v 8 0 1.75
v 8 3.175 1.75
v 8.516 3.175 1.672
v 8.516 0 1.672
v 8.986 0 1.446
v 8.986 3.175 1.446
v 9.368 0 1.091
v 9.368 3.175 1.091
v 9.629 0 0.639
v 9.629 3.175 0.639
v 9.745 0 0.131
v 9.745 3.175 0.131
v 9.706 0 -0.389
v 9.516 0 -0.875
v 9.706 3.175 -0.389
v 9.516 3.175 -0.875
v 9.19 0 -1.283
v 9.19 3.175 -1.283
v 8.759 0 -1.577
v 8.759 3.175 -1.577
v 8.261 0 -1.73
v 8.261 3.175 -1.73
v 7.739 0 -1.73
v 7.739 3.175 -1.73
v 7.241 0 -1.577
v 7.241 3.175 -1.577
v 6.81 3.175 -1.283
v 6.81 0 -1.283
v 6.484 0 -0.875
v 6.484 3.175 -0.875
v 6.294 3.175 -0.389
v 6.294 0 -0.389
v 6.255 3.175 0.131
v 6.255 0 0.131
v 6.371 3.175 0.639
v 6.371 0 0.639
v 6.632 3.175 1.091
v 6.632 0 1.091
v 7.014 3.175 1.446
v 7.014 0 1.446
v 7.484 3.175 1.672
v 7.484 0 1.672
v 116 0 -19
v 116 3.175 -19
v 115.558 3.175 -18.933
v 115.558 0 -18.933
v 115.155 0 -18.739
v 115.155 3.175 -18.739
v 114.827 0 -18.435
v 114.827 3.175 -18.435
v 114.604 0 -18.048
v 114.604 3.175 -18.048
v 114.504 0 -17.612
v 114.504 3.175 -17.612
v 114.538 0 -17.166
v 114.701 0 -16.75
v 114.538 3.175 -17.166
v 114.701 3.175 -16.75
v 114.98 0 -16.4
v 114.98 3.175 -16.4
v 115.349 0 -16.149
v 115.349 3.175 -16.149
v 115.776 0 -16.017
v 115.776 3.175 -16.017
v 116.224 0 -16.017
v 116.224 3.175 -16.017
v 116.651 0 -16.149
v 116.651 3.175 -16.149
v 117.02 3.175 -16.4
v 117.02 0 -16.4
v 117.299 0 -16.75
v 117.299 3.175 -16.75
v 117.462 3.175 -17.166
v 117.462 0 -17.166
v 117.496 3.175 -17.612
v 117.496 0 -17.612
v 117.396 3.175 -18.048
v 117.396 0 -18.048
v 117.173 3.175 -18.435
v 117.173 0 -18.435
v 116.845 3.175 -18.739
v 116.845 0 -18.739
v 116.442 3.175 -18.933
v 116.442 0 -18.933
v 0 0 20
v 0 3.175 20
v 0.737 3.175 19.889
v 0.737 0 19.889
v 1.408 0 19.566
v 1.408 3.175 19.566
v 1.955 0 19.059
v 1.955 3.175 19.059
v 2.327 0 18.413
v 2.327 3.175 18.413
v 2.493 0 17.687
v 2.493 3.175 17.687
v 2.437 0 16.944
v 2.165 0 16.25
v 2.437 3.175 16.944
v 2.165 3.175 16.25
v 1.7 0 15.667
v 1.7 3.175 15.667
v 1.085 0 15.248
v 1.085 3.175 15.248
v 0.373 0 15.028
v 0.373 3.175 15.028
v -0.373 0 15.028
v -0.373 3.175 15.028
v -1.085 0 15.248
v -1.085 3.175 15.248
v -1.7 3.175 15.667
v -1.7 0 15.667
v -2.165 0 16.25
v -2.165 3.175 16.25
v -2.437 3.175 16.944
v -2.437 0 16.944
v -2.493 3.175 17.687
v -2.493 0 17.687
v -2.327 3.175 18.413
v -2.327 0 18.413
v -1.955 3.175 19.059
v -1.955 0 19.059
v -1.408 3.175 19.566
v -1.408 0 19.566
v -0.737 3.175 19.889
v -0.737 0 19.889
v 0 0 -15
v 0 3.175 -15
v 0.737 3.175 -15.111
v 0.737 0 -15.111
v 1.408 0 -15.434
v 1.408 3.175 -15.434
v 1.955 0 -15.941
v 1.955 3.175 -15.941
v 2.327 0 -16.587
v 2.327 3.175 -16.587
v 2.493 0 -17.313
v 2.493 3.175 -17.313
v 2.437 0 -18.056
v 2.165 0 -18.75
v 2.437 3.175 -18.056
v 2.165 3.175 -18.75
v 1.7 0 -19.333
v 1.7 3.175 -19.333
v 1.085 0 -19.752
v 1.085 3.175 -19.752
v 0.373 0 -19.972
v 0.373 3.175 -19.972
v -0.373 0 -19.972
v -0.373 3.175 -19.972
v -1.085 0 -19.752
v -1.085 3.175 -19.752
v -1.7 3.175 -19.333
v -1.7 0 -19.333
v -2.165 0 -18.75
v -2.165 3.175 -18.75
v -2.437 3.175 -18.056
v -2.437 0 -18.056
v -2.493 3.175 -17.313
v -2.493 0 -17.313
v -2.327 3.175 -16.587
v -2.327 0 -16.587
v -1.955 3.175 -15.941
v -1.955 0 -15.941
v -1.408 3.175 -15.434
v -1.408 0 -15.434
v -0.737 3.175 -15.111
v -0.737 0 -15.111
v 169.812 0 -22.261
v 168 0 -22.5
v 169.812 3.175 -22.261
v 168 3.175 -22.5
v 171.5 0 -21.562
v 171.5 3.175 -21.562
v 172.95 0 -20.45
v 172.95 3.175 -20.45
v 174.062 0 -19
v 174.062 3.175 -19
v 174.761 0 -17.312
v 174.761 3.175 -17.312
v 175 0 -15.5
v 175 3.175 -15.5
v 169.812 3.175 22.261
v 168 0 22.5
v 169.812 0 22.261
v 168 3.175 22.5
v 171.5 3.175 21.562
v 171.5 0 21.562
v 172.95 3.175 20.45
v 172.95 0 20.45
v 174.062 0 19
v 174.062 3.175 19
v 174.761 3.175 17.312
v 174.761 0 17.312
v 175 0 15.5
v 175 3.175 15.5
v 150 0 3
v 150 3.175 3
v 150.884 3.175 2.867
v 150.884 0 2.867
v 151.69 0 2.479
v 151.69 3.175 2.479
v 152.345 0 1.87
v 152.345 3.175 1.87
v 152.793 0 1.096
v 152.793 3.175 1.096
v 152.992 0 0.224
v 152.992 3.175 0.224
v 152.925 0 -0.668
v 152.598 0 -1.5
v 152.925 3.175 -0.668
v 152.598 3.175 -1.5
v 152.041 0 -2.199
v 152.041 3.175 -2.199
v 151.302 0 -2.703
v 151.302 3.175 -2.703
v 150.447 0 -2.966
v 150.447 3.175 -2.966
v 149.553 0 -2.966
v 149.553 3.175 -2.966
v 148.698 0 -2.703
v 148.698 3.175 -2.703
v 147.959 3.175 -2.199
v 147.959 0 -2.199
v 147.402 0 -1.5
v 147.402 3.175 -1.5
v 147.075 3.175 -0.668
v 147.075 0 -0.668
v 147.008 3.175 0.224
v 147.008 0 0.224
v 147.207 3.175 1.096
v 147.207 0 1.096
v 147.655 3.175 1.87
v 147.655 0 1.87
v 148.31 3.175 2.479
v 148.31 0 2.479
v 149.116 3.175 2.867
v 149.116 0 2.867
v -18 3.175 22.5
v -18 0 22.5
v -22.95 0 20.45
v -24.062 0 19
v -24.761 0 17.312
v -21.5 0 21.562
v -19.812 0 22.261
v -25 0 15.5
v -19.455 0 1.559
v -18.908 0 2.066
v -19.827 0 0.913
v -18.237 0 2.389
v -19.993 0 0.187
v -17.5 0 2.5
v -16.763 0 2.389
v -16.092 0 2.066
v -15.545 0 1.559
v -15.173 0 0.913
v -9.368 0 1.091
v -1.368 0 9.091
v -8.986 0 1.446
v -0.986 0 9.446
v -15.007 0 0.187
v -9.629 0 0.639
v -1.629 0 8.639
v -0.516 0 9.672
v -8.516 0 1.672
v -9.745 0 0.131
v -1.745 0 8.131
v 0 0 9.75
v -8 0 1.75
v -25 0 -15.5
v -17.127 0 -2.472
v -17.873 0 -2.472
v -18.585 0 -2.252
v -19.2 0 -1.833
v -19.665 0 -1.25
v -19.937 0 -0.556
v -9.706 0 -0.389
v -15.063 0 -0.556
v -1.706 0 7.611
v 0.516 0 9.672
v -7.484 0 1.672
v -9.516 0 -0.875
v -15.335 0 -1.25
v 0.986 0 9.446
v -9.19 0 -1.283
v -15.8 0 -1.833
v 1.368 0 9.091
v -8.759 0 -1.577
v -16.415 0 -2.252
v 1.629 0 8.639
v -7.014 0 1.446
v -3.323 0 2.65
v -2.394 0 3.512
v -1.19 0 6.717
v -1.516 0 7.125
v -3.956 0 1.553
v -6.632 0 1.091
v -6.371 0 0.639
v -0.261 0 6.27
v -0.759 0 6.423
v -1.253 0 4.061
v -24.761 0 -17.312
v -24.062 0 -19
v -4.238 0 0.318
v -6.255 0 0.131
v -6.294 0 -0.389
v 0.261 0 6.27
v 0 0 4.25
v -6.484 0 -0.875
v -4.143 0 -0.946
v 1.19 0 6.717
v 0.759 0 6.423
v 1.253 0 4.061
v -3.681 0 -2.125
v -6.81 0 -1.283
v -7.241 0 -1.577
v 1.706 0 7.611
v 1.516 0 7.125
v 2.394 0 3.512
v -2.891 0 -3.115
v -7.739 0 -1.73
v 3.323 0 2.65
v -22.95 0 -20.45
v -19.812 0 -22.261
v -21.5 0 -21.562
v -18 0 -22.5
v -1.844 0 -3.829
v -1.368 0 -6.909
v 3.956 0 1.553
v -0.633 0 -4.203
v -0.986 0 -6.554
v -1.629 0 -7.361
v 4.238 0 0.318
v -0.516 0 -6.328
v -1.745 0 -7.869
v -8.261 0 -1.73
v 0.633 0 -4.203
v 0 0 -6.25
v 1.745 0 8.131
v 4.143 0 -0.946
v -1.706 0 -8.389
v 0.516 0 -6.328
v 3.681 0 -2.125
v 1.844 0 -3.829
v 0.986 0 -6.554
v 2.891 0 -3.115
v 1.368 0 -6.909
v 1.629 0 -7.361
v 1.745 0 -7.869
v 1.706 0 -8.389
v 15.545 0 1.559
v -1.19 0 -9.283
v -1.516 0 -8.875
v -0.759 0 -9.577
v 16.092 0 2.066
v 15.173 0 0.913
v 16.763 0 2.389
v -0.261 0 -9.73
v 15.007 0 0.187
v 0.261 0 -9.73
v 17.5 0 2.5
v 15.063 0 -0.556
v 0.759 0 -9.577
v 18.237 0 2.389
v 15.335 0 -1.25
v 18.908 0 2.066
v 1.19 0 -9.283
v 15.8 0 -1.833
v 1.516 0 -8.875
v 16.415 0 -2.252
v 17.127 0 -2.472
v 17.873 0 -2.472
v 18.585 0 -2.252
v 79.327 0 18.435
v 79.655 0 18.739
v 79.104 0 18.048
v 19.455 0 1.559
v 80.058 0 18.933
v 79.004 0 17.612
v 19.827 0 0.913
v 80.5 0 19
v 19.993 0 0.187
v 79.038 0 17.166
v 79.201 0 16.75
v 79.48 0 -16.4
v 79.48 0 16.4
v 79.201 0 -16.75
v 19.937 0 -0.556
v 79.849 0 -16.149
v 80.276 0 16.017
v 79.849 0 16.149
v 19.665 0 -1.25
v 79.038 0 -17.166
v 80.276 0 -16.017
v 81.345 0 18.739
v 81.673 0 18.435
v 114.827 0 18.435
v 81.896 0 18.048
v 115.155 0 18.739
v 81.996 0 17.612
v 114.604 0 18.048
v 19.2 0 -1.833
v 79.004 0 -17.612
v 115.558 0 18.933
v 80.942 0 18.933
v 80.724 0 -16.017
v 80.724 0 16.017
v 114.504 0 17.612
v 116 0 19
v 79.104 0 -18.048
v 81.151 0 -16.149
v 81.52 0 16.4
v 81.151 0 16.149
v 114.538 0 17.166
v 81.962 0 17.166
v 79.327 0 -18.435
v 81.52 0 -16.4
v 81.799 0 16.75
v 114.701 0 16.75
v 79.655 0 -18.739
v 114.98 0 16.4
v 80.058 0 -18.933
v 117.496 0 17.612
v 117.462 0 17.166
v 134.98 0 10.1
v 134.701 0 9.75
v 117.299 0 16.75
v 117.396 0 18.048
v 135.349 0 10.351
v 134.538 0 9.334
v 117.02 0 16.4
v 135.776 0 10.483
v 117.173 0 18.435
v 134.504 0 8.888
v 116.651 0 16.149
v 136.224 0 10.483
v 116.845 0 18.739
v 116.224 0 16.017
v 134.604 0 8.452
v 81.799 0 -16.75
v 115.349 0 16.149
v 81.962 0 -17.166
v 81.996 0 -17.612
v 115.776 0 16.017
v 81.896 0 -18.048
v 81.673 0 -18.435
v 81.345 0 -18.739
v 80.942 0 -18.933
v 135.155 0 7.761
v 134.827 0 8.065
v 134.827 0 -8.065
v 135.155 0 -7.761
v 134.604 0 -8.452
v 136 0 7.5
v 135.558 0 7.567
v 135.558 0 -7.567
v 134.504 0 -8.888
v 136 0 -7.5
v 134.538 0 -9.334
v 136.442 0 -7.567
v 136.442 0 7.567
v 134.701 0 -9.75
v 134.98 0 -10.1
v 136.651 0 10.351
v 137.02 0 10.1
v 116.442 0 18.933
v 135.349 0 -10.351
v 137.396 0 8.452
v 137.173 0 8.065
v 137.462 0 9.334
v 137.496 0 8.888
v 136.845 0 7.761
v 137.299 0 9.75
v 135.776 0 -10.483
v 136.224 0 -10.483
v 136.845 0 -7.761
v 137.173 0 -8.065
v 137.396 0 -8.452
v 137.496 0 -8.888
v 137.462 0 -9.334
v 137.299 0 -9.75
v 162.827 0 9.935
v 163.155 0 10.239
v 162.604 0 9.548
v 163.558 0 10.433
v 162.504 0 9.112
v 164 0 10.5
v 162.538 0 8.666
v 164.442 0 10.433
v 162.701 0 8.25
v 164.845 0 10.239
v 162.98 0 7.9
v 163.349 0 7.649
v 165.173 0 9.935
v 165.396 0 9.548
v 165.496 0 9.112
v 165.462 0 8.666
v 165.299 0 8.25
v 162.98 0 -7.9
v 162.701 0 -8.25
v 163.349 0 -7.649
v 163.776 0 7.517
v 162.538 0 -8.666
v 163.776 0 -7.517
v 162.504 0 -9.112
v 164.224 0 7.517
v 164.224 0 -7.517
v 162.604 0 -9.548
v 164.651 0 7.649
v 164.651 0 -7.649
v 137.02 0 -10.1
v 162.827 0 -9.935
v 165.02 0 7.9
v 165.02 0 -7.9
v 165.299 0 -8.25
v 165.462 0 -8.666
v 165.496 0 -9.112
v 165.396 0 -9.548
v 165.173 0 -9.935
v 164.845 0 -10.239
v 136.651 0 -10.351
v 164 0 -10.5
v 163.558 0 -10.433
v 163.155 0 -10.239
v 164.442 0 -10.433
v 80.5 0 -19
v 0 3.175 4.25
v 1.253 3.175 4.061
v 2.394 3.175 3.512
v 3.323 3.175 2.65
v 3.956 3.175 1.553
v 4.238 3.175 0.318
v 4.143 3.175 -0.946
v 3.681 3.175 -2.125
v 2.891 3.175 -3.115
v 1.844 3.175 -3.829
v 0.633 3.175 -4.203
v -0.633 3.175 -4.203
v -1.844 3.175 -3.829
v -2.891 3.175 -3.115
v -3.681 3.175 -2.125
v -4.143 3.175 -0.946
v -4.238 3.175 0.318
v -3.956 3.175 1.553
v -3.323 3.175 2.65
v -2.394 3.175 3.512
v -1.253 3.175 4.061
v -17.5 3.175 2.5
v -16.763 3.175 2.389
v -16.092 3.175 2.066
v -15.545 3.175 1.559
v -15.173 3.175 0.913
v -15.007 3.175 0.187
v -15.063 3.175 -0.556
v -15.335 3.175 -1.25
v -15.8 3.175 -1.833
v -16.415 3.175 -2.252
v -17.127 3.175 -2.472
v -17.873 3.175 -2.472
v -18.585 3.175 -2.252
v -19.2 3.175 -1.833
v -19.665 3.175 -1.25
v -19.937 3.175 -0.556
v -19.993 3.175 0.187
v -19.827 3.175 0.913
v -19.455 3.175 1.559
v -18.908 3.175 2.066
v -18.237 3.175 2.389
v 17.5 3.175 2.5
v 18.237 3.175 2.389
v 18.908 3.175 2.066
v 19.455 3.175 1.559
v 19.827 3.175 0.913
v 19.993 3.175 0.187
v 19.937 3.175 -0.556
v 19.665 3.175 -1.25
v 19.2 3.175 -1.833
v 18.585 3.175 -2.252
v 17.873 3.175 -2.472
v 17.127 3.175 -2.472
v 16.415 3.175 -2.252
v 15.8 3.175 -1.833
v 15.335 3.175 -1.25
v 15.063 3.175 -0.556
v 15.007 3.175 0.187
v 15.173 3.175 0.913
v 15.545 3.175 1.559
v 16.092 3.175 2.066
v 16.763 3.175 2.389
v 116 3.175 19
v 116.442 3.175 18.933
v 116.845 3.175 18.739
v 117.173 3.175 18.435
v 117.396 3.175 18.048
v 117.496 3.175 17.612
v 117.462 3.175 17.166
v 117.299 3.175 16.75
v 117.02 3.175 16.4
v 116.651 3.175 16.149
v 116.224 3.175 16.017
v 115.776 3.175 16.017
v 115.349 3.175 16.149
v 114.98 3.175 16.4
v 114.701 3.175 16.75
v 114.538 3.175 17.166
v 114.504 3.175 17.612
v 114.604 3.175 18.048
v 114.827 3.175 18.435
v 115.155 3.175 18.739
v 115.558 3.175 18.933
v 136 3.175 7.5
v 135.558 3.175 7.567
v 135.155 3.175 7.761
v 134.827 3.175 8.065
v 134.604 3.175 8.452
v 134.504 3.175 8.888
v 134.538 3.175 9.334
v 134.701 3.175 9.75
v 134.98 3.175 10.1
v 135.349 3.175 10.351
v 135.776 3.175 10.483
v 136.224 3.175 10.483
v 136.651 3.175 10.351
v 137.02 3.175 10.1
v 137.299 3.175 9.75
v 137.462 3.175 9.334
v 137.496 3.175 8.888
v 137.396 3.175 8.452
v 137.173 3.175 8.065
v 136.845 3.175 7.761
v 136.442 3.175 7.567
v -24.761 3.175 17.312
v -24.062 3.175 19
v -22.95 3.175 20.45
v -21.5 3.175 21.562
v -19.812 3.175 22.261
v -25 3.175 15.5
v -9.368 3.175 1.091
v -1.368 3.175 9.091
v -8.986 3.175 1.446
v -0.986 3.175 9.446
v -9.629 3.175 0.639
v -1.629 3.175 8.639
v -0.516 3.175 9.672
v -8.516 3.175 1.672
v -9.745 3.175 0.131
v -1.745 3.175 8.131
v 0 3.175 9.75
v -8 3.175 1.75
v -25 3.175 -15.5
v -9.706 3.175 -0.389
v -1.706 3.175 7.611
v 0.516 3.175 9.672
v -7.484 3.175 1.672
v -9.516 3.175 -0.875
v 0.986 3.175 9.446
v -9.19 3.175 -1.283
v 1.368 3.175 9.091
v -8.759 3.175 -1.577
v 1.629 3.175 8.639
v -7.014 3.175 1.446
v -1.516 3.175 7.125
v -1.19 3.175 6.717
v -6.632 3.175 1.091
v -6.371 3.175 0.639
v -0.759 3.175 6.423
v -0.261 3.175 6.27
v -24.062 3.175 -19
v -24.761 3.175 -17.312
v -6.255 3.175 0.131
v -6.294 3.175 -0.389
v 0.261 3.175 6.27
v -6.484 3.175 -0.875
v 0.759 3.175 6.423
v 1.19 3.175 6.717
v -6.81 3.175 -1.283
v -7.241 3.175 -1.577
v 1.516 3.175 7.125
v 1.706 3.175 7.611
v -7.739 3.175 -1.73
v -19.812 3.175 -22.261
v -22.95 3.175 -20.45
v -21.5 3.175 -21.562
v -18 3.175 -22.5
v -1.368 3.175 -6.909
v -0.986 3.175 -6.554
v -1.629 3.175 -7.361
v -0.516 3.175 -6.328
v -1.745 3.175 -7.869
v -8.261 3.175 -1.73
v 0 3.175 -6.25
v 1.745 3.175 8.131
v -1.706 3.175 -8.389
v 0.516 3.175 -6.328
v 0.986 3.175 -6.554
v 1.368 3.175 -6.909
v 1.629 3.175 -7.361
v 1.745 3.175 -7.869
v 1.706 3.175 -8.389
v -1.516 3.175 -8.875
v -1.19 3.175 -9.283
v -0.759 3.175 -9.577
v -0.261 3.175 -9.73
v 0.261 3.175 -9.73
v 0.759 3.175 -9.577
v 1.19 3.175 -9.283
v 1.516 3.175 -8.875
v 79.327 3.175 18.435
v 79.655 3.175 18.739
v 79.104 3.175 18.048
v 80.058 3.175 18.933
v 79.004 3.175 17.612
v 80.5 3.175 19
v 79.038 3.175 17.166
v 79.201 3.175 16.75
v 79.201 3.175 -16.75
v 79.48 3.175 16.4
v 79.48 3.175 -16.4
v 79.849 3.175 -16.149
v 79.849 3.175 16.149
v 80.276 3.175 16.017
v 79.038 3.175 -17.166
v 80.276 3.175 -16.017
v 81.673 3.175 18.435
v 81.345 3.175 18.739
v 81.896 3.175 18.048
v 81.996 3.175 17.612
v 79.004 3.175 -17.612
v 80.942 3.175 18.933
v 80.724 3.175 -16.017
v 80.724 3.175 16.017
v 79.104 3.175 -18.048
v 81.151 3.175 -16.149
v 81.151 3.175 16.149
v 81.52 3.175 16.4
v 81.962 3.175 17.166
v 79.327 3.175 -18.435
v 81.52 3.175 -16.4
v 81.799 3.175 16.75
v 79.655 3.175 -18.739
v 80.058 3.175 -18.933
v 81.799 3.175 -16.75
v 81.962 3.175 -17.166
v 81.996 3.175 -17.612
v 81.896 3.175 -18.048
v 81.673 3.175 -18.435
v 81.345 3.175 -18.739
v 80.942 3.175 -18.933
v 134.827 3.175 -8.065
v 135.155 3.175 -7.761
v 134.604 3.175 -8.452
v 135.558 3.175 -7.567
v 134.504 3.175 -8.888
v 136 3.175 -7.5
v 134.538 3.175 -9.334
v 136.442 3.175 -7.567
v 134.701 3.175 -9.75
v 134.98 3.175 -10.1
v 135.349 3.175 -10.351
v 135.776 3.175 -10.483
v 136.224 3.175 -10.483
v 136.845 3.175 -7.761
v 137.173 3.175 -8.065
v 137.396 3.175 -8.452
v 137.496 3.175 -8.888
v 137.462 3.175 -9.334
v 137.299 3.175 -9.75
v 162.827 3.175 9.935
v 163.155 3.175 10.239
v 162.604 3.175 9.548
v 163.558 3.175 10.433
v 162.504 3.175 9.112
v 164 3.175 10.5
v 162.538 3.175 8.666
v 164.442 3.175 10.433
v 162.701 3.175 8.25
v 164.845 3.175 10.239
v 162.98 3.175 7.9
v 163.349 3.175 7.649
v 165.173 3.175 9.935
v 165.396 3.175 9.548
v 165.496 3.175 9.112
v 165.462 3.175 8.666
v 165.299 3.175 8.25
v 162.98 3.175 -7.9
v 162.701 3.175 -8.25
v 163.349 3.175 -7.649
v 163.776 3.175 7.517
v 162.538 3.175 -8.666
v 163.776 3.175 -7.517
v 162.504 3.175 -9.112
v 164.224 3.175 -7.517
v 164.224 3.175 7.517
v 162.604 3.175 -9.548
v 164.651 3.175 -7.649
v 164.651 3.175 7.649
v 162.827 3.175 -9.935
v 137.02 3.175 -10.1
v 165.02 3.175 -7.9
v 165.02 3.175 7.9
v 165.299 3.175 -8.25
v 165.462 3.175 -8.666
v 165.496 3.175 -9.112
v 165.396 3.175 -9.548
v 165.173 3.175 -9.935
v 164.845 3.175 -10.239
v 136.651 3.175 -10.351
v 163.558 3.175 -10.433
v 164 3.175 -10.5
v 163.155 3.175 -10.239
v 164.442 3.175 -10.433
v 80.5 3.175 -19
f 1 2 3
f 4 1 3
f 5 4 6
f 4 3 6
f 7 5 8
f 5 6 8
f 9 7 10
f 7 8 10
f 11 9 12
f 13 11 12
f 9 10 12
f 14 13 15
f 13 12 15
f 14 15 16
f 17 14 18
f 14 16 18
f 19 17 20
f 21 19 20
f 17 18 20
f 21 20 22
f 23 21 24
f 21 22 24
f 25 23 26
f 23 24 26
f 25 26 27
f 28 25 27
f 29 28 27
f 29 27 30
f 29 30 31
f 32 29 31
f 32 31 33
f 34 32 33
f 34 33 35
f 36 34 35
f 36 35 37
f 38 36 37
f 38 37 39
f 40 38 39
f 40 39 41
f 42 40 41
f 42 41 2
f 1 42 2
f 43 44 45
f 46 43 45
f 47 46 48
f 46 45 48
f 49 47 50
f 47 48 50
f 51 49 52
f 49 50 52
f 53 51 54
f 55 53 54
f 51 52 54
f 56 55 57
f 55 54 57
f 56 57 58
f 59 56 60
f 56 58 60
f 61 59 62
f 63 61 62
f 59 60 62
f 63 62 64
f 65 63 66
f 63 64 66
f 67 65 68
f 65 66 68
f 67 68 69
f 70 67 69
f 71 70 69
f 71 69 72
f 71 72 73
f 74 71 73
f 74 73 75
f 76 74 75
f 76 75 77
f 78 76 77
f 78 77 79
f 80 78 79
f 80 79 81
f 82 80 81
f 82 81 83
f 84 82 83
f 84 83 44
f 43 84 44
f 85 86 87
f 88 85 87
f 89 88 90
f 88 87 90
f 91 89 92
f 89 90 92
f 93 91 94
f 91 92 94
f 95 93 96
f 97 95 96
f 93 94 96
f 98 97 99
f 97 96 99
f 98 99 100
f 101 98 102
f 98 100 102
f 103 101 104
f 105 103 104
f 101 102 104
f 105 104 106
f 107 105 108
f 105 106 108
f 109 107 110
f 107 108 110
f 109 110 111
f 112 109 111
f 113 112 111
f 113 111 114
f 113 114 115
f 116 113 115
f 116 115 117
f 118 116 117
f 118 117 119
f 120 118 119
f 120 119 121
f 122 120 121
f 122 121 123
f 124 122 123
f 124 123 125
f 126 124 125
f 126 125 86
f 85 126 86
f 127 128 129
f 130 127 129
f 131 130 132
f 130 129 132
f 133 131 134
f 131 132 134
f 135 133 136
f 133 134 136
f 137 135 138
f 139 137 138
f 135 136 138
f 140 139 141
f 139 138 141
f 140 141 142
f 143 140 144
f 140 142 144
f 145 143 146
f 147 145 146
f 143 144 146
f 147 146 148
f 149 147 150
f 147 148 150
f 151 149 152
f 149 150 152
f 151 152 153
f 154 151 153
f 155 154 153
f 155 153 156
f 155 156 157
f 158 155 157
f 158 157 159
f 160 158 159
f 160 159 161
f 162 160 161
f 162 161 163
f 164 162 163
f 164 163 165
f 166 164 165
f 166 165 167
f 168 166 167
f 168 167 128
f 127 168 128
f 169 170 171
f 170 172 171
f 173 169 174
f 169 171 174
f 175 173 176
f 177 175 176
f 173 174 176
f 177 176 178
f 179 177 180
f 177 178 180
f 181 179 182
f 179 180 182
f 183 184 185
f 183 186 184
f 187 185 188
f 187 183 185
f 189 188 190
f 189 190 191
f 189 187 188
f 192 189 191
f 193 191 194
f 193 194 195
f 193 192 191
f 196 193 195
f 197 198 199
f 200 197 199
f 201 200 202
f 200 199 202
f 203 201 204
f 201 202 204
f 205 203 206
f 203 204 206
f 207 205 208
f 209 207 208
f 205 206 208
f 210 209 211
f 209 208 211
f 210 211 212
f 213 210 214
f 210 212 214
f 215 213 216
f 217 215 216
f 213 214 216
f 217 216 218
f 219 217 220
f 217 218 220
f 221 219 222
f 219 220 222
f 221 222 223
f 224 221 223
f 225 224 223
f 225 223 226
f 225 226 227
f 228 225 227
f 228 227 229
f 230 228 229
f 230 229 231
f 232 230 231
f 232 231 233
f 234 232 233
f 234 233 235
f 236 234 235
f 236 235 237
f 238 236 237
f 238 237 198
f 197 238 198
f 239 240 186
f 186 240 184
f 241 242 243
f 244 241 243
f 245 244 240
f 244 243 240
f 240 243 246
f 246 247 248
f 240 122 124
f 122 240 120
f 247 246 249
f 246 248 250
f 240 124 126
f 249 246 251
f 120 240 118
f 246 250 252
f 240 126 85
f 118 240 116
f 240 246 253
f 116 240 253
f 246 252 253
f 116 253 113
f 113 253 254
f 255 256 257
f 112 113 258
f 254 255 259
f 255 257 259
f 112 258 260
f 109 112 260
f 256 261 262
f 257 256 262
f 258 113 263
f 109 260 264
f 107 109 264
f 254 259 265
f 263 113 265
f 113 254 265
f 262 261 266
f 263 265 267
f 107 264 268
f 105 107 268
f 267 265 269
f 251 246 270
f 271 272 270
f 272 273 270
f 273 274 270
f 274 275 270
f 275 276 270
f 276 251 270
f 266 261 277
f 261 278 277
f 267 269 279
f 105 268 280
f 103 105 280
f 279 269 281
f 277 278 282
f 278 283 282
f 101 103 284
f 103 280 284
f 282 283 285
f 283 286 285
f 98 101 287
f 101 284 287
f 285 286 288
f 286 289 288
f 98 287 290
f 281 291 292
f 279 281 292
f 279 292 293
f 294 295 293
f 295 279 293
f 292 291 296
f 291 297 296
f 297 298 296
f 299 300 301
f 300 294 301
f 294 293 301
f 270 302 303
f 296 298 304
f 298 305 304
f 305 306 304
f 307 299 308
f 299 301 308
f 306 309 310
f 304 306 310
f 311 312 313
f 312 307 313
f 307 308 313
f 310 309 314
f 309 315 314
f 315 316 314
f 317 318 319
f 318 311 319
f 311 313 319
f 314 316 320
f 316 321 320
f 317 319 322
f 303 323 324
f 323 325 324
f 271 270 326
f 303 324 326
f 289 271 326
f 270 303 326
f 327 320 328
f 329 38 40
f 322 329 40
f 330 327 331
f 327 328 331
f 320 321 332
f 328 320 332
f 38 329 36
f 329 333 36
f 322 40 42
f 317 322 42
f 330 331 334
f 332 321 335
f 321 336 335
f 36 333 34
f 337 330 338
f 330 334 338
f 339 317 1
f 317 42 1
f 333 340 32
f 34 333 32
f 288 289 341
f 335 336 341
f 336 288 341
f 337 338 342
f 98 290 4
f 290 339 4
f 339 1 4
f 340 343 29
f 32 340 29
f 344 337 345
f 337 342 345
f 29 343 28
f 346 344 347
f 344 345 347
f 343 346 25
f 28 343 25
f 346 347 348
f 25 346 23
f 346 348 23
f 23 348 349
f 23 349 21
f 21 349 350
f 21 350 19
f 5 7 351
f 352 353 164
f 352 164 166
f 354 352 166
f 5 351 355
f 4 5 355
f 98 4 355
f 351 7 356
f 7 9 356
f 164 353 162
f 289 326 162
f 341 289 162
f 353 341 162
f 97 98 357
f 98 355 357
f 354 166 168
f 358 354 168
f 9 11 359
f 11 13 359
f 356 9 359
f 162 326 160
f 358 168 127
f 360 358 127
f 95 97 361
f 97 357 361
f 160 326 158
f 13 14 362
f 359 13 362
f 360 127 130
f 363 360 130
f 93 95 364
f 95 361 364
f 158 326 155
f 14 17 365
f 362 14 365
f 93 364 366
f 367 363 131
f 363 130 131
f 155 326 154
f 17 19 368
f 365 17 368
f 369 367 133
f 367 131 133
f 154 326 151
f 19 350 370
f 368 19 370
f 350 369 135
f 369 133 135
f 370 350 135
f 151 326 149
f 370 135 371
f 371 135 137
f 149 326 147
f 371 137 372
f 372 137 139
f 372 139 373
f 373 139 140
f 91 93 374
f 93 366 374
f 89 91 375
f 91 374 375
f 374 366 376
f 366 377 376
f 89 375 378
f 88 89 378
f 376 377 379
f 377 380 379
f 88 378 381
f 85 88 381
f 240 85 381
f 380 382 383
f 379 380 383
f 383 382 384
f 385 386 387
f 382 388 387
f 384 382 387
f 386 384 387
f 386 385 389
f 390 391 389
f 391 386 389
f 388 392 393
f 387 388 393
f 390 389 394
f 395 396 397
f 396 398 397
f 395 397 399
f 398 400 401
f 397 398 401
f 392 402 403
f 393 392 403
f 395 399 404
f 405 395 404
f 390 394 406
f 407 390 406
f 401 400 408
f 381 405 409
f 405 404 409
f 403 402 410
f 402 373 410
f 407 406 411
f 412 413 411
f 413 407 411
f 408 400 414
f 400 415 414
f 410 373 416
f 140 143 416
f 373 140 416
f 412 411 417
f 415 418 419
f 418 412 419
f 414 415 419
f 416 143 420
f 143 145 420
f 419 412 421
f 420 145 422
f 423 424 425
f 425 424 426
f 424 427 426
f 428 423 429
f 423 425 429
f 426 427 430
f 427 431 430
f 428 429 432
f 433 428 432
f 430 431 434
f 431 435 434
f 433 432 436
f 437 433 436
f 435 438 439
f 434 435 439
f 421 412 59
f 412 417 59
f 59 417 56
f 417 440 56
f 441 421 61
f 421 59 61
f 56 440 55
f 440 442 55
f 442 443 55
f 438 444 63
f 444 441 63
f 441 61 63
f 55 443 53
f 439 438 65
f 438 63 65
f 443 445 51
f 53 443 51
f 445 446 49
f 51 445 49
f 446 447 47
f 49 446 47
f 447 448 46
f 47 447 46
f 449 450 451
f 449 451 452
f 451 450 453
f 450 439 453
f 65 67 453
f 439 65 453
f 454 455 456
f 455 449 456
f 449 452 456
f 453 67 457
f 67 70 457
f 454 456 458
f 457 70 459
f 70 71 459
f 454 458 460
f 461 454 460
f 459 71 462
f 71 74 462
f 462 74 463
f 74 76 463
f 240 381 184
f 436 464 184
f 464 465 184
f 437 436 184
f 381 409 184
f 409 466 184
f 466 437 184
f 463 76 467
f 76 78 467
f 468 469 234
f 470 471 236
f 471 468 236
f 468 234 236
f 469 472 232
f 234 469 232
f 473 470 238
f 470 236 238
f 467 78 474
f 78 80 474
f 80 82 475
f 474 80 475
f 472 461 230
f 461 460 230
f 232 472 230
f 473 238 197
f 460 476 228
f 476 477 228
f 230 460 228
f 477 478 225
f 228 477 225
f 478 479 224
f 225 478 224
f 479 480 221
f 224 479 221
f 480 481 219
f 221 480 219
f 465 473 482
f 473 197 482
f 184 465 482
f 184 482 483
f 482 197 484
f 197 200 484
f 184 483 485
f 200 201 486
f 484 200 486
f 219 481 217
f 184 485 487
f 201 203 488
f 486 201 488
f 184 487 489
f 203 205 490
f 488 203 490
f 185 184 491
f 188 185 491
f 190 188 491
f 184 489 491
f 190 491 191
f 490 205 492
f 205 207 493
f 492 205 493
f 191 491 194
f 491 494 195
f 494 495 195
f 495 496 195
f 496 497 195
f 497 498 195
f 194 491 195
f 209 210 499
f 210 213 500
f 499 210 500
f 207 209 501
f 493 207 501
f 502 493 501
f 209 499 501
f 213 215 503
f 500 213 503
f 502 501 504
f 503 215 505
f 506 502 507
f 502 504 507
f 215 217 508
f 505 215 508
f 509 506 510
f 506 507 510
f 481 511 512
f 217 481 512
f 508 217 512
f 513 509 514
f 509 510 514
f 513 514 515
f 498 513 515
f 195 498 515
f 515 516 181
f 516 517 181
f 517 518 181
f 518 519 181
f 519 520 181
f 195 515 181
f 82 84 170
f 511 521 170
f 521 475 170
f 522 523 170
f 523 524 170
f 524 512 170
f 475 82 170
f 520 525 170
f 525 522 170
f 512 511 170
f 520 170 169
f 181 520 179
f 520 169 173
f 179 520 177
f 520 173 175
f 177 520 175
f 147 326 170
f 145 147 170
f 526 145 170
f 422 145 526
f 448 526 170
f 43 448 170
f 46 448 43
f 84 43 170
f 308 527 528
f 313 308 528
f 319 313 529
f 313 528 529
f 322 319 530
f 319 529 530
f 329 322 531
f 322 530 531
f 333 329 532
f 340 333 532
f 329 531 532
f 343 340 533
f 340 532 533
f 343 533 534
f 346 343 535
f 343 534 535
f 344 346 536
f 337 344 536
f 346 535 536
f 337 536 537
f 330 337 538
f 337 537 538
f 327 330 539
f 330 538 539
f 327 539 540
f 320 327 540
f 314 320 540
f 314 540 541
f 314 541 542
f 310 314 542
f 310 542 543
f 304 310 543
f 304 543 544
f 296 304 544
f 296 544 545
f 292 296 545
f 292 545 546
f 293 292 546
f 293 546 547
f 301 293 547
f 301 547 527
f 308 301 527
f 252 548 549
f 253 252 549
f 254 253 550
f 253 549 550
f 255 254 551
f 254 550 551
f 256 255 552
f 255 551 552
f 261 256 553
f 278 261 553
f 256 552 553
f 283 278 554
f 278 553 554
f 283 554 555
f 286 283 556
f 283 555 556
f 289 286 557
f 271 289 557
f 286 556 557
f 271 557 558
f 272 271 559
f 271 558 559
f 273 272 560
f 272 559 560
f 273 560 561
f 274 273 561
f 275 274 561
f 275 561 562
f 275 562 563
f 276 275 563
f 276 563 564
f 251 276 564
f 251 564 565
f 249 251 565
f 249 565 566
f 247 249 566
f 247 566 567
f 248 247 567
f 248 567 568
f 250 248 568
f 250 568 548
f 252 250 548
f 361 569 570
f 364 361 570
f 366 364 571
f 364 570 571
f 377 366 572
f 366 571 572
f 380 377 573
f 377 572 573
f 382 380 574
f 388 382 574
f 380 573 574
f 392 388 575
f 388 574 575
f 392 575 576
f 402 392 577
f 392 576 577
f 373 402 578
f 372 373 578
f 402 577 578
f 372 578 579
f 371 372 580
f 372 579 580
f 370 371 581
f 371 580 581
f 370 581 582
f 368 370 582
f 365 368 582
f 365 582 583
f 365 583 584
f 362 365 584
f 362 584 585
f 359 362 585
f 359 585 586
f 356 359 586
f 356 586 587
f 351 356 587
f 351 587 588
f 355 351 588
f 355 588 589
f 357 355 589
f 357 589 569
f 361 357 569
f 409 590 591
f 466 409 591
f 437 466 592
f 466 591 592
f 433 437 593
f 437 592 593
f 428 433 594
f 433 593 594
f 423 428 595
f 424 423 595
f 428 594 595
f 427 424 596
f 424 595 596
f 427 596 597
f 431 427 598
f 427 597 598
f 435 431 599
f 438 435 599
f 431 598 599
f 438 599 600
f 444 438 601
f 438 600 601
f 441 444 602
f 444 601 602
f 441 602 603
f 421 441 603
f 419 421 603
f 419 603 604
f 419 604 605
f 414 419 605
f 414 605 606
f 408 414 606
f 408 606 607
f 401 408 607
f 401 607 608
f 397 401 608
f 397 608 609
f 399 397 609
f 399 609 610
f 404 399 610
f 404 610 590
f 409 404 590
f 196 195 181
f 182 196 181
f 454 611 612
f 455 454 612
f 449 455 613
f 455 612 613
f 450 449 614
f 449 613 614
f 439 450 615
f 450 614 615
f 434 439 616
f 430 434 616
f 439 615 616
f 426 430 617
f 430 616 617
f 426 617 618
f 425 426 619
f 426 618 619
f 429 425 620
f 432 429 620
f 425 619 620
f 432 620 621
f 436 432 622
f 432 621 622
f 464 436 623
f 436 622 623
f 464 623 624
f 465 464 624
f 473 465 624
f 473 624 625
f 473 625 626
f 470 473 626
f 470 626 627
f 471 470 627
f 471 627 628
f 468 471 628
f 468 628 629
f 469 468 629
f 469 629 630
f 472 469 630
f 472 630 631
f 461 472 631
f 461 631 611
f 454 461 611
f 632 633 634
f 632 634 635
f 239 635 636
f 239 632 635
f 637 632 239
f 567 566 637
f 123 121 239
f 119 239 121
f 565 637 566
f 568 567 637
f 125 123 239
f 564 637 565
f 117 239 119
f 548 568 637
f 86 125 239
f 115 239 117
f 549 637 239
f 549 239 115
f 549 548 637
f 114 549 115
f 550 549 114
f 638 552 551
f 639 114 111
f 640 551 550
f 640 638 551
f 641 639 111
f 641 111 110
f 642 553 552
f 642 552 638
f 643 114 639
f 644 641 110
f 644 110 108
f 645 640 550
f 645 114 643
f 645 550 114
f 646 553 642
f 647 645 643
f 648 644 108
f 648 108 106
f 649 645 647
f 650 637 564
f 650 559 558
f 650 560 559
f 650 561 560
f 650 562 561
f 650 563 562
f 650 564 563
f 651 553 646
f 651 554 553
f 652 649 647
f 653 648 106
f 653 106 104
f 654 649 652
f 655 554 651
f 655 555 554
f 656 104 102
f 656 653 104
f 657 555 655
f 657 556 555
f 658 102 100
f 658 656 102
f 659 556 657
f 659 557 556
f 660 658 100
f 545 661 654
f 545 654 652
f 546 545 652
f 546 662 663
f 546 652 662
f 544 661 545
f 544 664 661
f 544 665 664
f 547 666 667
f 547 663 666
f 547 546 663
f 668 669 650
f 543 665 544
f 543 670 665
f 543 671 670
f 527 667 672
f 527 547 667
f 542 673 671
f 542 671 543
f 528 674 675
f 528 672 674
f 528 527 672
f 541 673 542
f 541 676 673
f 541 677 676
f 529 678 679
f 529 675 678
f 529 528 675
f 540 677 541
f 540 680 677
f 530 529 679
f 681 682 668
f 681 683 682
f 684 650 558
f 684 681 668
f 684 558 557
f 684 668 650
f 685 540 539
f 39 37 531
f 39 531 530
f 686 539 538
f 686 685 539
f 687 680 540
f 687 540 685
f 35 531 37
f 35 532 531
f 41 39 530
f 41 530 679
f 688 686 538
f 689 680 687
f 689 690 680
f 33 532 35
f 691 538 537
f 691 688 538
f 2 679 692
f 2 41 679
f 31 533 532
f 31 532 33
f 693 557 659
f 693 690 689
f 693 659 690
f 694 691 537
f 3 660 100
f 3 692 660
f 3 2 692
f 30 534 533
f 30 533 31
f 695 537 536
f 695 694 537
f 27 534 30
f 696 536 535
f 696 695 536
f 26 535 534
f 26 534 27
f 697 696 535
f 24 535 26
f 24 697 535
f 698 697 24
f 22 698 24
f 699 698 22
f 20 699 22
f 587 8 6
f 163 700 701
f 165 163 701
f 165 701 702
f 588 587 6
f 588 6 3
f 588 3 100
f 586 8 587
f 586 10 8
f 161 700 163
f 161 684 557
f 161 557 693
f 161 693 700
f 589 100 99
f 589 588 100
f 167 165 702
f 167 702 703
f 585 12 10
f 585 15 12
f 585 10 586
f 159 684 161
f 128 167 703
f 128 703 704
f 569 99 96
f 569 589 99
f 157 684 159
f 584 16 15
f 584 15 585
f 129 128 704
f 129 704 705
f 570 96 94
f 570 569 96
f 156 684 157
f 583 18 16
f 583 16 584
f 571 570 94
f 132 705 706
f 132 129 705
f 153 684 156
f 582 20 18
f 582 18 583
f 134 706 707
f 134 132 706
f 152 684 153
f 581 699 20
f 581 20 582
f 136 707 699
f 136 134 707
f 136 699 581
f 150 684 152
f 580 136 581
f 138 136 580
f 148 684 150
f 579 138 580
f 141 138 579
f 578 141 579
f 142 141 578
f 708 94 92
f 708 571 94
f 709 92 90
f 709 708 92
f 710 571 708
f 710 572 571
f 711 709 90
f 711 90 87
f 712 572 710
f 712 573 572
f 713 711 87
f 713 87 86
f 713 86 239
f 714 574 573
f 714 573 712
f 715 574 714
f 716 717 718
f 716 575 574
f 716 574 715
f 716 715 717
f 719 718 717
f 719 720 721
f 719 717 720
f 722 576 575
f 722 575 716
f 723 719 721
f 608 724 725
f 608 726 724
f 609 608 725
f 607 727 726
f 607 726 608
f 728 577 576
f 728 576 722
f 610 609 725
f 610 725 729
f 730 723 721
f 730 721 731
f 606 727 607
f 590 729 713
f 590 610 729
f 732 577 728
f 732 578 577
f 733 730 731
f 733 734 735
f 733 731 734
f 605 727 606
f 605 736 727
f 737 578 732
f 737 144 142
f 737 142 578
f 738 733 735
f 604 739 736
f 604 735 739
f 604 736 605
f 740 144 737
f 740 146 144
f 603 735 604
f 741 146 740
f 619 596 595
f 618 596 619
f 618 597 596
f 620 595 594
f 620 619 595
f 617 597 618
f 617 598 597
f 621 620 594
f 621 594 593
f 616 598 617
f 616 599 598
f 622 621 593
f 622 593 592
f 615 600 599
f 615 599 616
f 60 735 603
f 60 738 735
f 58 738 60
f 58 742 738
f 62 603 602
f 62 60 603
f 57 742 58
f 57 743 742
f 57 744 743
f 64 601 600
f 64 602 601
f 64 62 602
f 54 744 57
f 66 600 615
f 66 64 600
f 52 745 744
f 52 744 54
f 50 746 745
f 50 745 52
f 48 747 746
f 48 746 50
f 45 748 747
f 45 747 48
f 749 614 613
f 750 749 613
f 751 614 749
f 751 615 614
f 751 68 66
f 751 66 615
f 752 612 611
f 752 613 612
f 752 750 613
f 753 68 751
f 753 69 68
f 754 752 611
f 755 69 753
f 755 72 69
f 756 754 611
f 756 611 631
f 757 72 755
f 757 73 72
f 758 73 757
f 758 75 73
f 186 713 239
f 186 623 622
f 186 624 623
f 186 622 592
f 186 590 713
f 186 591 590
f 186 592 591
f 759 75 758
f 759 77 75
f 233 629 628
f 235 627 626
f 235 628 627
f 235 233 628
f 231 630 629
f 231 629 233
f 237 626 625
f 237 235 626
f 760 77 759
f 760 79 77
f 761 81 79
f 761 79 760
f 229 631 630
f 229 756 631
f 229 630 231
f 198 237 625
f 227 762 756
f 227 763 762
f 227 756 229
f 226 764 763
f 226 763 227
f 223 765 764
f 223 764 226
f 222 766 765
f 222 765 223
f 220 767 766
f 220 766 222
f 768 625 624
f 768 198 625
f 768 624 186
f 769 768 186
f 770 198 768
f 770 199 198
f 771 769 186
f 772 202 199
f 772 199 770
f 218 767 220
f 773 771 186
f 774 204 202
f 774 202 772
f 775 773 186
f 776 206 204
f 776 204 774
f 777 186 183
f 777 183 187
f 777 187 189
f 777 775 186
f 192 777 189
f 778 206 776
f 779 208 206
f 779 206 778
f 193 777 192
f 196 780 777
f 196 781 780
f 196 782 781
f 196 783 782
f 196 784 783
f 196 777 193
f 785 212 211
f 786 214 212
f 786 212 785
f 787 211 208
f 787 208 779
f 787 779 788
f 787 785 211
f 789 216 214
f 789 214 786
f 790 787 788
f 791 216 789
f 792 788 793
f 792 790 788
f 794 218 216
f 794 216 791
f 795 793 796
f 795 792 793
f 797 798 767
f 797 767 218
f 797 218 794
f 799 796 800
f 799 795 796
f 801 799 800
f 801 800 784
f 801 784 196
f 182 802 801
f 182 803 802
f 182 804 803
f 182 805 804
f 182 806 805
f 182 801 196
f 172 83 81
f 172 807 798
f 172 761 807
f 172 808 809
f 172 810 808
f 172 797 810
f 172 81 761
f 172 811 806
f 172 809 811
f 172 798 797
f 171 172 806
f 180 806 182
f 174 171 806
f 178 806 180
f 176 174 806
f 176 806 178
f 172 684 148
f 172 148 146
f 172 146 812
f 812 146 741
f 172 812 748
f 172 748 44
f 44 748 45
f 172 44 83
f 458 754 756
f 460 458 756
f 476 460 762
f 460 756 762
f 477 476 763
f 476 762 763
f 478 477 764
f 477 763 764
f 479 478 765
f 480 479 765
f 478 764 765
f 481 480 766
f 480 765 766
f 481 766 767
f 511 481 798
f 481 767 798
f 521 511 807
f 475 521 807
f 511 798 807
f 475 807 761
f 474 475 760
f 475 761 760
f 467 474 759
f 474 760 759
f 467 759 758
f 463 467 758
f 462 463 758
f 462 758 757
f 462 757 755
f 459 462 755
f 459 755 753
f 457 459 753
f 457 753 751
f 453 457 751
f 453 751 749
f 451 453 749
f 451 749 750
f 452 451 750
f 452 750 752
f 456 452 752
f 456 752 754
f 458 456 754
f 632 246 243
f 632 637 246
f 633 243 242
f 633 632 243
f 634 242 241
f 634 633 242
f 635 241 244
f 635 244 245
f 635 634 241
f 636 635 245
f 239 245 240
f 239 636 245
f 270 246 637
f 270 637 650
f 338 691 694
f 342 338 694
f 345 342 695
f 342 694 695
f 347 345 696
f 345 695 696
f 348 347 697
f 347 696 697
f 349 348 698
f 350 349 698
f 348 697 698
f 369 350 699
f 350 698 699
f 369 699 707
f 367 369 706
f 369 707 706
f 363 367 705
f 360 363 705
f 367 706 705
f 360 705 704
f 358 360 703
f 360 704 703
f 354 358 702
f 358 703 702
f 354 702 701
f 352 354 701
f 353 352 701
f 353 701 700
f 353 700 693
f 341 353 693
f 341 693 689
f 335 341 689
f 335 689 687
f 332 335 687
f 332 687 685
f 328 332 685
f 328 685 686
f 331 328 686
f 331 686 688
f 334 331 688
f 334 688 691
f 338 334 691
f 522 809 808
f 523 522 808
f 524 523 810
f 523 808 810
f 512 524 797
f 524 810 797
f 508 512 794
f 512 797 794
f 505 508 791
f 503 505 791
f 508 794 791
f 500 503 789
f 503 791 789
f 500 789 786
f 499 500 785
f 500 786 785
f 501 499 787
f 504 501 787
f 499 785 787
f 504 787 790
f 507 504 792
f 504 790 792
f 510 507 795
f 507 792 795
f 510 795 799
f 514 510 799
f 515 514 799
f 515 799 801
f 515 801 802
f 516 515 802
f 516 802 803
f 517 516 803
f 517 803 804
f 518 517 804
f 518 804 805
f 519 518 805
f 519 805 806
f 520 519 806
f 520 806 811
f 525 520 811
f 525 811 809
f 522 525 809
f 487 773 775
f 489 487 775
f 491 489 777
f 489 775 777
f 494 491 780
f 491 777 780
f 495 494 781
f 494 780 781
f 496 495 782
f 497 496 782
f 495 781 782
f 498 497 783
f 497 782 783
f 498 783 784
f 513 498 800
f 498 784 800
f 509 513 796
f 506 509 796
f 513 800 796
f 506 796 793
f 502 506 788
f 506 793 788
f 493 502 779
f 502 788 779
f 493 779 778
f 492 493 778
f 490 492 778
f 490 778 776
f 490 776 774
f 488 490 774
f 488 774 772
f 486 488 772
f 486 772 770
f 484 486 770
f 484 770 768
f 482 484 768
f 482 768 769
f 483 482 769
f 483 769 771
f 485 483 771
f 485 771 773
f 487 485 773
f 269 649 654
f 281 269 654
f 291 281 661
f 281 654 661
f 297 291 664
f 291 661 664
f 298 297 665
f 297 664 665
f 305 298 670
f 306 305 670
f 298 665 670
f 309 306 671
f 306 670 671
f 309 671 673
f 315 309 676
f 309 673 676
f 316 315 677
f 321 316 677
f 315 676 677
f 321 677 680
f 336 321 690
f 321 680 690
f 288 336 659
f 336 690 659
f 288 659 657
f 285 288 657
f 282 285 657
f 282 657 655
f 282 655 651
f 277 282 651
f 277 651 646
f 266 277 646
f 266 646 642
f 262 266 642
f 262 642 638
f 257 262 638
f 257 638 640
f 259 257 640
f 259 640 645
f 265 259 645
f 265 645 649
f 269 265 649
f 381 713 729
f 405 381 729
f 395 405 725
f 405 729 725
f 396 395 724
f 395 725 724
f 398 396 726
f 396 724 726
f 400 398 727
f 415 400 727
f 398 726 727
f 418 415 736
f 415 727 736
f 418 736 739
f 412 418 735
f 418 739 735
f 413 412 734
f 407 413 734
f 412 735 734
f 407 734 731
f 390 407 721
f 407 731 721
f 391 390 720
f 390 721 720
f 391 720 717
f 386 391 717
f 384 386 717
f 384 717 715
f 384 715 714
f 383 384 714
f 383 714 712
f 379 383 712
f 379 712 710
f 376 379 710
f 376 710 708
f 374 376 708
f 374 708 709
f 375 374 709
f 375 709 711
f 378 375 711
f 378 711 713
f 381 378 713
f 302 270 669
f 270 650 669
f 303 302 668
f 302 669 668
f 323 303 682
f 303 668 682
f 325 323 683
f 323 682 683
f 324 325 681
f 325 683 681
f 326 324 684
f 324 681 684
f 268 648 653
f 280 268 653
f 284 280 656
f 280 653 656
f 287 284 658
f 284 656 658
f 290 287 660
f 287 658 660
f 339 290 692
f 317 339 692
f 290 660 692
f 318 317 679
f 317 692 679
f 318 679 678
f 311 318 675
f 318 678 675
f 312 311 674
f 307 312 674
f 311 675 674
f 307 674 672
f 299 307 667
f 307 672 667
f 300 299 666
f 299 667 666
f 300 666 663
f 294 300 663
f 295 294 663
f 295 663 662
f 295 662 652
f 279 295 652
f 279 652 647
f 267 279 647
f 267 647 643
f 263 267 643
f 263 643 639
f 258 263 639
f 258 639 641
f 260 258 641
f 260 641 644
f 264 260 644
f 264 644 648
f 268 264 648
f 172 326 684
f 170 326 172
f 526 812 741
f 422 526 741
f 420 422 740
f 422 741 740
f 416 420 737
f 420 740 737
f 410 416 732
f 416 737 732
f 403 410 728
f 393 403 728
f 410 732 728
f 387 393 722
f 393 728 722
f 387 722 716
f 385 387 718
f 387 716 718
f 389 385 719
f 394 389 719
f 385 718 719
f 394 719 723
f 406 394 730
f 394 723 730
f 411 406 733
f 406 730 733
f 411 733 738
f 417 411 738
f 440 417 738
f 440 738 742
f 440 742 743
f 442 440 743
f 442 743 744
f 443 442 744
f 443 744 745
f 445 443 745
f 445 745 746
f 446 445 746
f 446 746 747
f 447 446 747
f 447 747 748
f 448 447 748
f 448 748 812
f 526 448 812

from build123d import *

# Parameters (mm, degrees)
SKETCH1_W           = 200
SKETCH1_H           = 45
BOSS_EXTRUDE1_DEPTH = 3.175
SKETCH4_R           = 3
SKETCH4_R_2         = 1.5
CUT_EXTRUDE1_DEPTH  = 177.469064215
SKETCH5_R           = 4.25
CUT_EXTRUDE2_DEPTH  = 177.469064215
SKETCH10_R          = 1.5
CUT_EXTRUDE4_DEPTH  = 177.469064215
FILLET1_R           = 7
SKETCH11_R          = 2.5
CUT_EXTRUDE5_DEPTH  = 177.469064215
SKETCH12_R          = 1.75
CUT_EXTRUDE6_DEPTH  = 177.469064215


with BuildPart() as part:
    # Sketch1 → Boss-Extrude1 (new body)
    with BuildSketch(Plane(origin=(0, 0, 0), x_dir=(1, 0, 0), z_dir=(0, 1, 0))):
        with Locations((75, 0)):
            Rectangle(SKETCH1_W, SKETCH1_H)
    extrude(amount=BOSS_EXTRUDE1_DEPTH)

    # Sketch4 → Cut-Extrude1 (cut, through all)
    with BuildSketch(Plane(origin=(0, 3.175, 0), x_dir=(1, 0, 0), z_dir=(0, 1, 0))):
        with Locations(Location((150, 0, 0), (0, 0, 270))):
            Circle(SKETCH4_R)
        with Locations(Location((136, 9, 0), (0, 0, 270))):
            Circle(SKETCH4_R_2)
        with Locations(Location((164, 9, 0), (0, 0, 90))):
            Circle(SKETCH4_R_2)
        with Locations(Location((164, -9, 0), (0, 0, 270))):
            Circle(SKETCH4_R_2)
        with Locations(Location((136, -9, 0), (0, 0, 90))):
            Circle(SKETCH4_R_2)
    extrude(amount=-CUT_EXTRUDE1_DEPTH, mode=Mode.SUBTRACT)

    # Sketch5 → Cut-Extrude2 (cut, through all)
    with BuildSketch(Plane(origin=(0, 3.175, 0), x_dir=(1, 0, 0), z_dir=(0, 1, 0))):
        with Locations(Location((0, 0, 0), (0, 0, 270))):
            Circle(SKETCH5_R)
    extrude(amount=-CUT_EXTRUDE2_DEPTH, mode=Mode.SUBTRACT)

    # Sketch10 → Cut-Extrude4 (cut, through all)
    with BuildSketch(Plane(origin=(0, 3.175, 0), x_dir=(1, 0, 0), z_dir=(0, 1, 0))):
        with Locations(Location((80.5, -17.5, 0), (0, 0, 270))):
            Circle(SKETCH10_R)
        with Locations(Location((116, -17.5, 0), (0, 0, 270))):
            Circle(SKETCH10_R)
        with Locations(Location((116, 17.5, 0), (0, 0, 90))):
            Circle(SKETCH10_R)
        with Locations(Location((80.5, 17.5, 0), (0, 0, 90))):
            Circle(SKETCH10_R)
    extrude(amount=-CUT_EXTRUDE4_DEPTH, mode=Mode.SUBTRACT)

    # Fillet1
    fillet1_edges = [part.edges().sort_by_distance(p)[0] for p in [
        (-25, 1.5875, -22.5),
        (175, 1.5875, -22.5),
        (175, 1.5875, 22.5),
        (-25, 1.5875, 22.5),
    ]]
    fillet(fillet1_edges, radius=FILLET1_R)

    # Sketch11 → Cut-Extrude5 (cut, through all)
    with BuildSketch(Plane(origin=(0, 3.175, 0), x_dir=(1, 0, 0), z_dir=(0, 1, 0))):
        with Locations(Location((0, 17.5, 0), (0, 0, 270))):
            Circle(SKETCH11_R)
        with Locations(Location((17.5, 0, 0), (0, 0, 270))):
            Circle(SKETCH11_R)
        with Locations(Location((0, -17.5, 0), (0, 0, 270))):
            Circle(SKETCH11_R)
        with Locations(Location((-17.5, 0, 0), (0, 0, 270))):
            Circle(SKETCH11_R)
    extrude(amount=-CUT_EXTRUDE5_DEPTH, mode=Mode.SUBTRACT)

    # Sketch12 → Cut-Extrude6 (cut, through all)
    with BuildSketch(Plane(origin=(0, 3.175, 0), x_dir=(1, 0, 0), z_dir=(0, 1, 0))):
        with Locations(Location((0, 8, 0), (0, 0, 270))):
            Circle(SKETCH12_R)
        with Locations(Location((8, 0, 0), (0, 0, 270))):
            Circle(SKETCH12_R)
        with Locations(Location((0, -8, 0), (0, 0, 270))):
            Circle(SKETCH12_R)
        with Locations(Location((-8, 0, 0), (0, 0, 270))):
            Circle(SKETCH12_R)
    extrude(amount=-CUT_EXTRUDE6_DEPTH, mode=Mode.SUBTRACT)


solid = part.part
